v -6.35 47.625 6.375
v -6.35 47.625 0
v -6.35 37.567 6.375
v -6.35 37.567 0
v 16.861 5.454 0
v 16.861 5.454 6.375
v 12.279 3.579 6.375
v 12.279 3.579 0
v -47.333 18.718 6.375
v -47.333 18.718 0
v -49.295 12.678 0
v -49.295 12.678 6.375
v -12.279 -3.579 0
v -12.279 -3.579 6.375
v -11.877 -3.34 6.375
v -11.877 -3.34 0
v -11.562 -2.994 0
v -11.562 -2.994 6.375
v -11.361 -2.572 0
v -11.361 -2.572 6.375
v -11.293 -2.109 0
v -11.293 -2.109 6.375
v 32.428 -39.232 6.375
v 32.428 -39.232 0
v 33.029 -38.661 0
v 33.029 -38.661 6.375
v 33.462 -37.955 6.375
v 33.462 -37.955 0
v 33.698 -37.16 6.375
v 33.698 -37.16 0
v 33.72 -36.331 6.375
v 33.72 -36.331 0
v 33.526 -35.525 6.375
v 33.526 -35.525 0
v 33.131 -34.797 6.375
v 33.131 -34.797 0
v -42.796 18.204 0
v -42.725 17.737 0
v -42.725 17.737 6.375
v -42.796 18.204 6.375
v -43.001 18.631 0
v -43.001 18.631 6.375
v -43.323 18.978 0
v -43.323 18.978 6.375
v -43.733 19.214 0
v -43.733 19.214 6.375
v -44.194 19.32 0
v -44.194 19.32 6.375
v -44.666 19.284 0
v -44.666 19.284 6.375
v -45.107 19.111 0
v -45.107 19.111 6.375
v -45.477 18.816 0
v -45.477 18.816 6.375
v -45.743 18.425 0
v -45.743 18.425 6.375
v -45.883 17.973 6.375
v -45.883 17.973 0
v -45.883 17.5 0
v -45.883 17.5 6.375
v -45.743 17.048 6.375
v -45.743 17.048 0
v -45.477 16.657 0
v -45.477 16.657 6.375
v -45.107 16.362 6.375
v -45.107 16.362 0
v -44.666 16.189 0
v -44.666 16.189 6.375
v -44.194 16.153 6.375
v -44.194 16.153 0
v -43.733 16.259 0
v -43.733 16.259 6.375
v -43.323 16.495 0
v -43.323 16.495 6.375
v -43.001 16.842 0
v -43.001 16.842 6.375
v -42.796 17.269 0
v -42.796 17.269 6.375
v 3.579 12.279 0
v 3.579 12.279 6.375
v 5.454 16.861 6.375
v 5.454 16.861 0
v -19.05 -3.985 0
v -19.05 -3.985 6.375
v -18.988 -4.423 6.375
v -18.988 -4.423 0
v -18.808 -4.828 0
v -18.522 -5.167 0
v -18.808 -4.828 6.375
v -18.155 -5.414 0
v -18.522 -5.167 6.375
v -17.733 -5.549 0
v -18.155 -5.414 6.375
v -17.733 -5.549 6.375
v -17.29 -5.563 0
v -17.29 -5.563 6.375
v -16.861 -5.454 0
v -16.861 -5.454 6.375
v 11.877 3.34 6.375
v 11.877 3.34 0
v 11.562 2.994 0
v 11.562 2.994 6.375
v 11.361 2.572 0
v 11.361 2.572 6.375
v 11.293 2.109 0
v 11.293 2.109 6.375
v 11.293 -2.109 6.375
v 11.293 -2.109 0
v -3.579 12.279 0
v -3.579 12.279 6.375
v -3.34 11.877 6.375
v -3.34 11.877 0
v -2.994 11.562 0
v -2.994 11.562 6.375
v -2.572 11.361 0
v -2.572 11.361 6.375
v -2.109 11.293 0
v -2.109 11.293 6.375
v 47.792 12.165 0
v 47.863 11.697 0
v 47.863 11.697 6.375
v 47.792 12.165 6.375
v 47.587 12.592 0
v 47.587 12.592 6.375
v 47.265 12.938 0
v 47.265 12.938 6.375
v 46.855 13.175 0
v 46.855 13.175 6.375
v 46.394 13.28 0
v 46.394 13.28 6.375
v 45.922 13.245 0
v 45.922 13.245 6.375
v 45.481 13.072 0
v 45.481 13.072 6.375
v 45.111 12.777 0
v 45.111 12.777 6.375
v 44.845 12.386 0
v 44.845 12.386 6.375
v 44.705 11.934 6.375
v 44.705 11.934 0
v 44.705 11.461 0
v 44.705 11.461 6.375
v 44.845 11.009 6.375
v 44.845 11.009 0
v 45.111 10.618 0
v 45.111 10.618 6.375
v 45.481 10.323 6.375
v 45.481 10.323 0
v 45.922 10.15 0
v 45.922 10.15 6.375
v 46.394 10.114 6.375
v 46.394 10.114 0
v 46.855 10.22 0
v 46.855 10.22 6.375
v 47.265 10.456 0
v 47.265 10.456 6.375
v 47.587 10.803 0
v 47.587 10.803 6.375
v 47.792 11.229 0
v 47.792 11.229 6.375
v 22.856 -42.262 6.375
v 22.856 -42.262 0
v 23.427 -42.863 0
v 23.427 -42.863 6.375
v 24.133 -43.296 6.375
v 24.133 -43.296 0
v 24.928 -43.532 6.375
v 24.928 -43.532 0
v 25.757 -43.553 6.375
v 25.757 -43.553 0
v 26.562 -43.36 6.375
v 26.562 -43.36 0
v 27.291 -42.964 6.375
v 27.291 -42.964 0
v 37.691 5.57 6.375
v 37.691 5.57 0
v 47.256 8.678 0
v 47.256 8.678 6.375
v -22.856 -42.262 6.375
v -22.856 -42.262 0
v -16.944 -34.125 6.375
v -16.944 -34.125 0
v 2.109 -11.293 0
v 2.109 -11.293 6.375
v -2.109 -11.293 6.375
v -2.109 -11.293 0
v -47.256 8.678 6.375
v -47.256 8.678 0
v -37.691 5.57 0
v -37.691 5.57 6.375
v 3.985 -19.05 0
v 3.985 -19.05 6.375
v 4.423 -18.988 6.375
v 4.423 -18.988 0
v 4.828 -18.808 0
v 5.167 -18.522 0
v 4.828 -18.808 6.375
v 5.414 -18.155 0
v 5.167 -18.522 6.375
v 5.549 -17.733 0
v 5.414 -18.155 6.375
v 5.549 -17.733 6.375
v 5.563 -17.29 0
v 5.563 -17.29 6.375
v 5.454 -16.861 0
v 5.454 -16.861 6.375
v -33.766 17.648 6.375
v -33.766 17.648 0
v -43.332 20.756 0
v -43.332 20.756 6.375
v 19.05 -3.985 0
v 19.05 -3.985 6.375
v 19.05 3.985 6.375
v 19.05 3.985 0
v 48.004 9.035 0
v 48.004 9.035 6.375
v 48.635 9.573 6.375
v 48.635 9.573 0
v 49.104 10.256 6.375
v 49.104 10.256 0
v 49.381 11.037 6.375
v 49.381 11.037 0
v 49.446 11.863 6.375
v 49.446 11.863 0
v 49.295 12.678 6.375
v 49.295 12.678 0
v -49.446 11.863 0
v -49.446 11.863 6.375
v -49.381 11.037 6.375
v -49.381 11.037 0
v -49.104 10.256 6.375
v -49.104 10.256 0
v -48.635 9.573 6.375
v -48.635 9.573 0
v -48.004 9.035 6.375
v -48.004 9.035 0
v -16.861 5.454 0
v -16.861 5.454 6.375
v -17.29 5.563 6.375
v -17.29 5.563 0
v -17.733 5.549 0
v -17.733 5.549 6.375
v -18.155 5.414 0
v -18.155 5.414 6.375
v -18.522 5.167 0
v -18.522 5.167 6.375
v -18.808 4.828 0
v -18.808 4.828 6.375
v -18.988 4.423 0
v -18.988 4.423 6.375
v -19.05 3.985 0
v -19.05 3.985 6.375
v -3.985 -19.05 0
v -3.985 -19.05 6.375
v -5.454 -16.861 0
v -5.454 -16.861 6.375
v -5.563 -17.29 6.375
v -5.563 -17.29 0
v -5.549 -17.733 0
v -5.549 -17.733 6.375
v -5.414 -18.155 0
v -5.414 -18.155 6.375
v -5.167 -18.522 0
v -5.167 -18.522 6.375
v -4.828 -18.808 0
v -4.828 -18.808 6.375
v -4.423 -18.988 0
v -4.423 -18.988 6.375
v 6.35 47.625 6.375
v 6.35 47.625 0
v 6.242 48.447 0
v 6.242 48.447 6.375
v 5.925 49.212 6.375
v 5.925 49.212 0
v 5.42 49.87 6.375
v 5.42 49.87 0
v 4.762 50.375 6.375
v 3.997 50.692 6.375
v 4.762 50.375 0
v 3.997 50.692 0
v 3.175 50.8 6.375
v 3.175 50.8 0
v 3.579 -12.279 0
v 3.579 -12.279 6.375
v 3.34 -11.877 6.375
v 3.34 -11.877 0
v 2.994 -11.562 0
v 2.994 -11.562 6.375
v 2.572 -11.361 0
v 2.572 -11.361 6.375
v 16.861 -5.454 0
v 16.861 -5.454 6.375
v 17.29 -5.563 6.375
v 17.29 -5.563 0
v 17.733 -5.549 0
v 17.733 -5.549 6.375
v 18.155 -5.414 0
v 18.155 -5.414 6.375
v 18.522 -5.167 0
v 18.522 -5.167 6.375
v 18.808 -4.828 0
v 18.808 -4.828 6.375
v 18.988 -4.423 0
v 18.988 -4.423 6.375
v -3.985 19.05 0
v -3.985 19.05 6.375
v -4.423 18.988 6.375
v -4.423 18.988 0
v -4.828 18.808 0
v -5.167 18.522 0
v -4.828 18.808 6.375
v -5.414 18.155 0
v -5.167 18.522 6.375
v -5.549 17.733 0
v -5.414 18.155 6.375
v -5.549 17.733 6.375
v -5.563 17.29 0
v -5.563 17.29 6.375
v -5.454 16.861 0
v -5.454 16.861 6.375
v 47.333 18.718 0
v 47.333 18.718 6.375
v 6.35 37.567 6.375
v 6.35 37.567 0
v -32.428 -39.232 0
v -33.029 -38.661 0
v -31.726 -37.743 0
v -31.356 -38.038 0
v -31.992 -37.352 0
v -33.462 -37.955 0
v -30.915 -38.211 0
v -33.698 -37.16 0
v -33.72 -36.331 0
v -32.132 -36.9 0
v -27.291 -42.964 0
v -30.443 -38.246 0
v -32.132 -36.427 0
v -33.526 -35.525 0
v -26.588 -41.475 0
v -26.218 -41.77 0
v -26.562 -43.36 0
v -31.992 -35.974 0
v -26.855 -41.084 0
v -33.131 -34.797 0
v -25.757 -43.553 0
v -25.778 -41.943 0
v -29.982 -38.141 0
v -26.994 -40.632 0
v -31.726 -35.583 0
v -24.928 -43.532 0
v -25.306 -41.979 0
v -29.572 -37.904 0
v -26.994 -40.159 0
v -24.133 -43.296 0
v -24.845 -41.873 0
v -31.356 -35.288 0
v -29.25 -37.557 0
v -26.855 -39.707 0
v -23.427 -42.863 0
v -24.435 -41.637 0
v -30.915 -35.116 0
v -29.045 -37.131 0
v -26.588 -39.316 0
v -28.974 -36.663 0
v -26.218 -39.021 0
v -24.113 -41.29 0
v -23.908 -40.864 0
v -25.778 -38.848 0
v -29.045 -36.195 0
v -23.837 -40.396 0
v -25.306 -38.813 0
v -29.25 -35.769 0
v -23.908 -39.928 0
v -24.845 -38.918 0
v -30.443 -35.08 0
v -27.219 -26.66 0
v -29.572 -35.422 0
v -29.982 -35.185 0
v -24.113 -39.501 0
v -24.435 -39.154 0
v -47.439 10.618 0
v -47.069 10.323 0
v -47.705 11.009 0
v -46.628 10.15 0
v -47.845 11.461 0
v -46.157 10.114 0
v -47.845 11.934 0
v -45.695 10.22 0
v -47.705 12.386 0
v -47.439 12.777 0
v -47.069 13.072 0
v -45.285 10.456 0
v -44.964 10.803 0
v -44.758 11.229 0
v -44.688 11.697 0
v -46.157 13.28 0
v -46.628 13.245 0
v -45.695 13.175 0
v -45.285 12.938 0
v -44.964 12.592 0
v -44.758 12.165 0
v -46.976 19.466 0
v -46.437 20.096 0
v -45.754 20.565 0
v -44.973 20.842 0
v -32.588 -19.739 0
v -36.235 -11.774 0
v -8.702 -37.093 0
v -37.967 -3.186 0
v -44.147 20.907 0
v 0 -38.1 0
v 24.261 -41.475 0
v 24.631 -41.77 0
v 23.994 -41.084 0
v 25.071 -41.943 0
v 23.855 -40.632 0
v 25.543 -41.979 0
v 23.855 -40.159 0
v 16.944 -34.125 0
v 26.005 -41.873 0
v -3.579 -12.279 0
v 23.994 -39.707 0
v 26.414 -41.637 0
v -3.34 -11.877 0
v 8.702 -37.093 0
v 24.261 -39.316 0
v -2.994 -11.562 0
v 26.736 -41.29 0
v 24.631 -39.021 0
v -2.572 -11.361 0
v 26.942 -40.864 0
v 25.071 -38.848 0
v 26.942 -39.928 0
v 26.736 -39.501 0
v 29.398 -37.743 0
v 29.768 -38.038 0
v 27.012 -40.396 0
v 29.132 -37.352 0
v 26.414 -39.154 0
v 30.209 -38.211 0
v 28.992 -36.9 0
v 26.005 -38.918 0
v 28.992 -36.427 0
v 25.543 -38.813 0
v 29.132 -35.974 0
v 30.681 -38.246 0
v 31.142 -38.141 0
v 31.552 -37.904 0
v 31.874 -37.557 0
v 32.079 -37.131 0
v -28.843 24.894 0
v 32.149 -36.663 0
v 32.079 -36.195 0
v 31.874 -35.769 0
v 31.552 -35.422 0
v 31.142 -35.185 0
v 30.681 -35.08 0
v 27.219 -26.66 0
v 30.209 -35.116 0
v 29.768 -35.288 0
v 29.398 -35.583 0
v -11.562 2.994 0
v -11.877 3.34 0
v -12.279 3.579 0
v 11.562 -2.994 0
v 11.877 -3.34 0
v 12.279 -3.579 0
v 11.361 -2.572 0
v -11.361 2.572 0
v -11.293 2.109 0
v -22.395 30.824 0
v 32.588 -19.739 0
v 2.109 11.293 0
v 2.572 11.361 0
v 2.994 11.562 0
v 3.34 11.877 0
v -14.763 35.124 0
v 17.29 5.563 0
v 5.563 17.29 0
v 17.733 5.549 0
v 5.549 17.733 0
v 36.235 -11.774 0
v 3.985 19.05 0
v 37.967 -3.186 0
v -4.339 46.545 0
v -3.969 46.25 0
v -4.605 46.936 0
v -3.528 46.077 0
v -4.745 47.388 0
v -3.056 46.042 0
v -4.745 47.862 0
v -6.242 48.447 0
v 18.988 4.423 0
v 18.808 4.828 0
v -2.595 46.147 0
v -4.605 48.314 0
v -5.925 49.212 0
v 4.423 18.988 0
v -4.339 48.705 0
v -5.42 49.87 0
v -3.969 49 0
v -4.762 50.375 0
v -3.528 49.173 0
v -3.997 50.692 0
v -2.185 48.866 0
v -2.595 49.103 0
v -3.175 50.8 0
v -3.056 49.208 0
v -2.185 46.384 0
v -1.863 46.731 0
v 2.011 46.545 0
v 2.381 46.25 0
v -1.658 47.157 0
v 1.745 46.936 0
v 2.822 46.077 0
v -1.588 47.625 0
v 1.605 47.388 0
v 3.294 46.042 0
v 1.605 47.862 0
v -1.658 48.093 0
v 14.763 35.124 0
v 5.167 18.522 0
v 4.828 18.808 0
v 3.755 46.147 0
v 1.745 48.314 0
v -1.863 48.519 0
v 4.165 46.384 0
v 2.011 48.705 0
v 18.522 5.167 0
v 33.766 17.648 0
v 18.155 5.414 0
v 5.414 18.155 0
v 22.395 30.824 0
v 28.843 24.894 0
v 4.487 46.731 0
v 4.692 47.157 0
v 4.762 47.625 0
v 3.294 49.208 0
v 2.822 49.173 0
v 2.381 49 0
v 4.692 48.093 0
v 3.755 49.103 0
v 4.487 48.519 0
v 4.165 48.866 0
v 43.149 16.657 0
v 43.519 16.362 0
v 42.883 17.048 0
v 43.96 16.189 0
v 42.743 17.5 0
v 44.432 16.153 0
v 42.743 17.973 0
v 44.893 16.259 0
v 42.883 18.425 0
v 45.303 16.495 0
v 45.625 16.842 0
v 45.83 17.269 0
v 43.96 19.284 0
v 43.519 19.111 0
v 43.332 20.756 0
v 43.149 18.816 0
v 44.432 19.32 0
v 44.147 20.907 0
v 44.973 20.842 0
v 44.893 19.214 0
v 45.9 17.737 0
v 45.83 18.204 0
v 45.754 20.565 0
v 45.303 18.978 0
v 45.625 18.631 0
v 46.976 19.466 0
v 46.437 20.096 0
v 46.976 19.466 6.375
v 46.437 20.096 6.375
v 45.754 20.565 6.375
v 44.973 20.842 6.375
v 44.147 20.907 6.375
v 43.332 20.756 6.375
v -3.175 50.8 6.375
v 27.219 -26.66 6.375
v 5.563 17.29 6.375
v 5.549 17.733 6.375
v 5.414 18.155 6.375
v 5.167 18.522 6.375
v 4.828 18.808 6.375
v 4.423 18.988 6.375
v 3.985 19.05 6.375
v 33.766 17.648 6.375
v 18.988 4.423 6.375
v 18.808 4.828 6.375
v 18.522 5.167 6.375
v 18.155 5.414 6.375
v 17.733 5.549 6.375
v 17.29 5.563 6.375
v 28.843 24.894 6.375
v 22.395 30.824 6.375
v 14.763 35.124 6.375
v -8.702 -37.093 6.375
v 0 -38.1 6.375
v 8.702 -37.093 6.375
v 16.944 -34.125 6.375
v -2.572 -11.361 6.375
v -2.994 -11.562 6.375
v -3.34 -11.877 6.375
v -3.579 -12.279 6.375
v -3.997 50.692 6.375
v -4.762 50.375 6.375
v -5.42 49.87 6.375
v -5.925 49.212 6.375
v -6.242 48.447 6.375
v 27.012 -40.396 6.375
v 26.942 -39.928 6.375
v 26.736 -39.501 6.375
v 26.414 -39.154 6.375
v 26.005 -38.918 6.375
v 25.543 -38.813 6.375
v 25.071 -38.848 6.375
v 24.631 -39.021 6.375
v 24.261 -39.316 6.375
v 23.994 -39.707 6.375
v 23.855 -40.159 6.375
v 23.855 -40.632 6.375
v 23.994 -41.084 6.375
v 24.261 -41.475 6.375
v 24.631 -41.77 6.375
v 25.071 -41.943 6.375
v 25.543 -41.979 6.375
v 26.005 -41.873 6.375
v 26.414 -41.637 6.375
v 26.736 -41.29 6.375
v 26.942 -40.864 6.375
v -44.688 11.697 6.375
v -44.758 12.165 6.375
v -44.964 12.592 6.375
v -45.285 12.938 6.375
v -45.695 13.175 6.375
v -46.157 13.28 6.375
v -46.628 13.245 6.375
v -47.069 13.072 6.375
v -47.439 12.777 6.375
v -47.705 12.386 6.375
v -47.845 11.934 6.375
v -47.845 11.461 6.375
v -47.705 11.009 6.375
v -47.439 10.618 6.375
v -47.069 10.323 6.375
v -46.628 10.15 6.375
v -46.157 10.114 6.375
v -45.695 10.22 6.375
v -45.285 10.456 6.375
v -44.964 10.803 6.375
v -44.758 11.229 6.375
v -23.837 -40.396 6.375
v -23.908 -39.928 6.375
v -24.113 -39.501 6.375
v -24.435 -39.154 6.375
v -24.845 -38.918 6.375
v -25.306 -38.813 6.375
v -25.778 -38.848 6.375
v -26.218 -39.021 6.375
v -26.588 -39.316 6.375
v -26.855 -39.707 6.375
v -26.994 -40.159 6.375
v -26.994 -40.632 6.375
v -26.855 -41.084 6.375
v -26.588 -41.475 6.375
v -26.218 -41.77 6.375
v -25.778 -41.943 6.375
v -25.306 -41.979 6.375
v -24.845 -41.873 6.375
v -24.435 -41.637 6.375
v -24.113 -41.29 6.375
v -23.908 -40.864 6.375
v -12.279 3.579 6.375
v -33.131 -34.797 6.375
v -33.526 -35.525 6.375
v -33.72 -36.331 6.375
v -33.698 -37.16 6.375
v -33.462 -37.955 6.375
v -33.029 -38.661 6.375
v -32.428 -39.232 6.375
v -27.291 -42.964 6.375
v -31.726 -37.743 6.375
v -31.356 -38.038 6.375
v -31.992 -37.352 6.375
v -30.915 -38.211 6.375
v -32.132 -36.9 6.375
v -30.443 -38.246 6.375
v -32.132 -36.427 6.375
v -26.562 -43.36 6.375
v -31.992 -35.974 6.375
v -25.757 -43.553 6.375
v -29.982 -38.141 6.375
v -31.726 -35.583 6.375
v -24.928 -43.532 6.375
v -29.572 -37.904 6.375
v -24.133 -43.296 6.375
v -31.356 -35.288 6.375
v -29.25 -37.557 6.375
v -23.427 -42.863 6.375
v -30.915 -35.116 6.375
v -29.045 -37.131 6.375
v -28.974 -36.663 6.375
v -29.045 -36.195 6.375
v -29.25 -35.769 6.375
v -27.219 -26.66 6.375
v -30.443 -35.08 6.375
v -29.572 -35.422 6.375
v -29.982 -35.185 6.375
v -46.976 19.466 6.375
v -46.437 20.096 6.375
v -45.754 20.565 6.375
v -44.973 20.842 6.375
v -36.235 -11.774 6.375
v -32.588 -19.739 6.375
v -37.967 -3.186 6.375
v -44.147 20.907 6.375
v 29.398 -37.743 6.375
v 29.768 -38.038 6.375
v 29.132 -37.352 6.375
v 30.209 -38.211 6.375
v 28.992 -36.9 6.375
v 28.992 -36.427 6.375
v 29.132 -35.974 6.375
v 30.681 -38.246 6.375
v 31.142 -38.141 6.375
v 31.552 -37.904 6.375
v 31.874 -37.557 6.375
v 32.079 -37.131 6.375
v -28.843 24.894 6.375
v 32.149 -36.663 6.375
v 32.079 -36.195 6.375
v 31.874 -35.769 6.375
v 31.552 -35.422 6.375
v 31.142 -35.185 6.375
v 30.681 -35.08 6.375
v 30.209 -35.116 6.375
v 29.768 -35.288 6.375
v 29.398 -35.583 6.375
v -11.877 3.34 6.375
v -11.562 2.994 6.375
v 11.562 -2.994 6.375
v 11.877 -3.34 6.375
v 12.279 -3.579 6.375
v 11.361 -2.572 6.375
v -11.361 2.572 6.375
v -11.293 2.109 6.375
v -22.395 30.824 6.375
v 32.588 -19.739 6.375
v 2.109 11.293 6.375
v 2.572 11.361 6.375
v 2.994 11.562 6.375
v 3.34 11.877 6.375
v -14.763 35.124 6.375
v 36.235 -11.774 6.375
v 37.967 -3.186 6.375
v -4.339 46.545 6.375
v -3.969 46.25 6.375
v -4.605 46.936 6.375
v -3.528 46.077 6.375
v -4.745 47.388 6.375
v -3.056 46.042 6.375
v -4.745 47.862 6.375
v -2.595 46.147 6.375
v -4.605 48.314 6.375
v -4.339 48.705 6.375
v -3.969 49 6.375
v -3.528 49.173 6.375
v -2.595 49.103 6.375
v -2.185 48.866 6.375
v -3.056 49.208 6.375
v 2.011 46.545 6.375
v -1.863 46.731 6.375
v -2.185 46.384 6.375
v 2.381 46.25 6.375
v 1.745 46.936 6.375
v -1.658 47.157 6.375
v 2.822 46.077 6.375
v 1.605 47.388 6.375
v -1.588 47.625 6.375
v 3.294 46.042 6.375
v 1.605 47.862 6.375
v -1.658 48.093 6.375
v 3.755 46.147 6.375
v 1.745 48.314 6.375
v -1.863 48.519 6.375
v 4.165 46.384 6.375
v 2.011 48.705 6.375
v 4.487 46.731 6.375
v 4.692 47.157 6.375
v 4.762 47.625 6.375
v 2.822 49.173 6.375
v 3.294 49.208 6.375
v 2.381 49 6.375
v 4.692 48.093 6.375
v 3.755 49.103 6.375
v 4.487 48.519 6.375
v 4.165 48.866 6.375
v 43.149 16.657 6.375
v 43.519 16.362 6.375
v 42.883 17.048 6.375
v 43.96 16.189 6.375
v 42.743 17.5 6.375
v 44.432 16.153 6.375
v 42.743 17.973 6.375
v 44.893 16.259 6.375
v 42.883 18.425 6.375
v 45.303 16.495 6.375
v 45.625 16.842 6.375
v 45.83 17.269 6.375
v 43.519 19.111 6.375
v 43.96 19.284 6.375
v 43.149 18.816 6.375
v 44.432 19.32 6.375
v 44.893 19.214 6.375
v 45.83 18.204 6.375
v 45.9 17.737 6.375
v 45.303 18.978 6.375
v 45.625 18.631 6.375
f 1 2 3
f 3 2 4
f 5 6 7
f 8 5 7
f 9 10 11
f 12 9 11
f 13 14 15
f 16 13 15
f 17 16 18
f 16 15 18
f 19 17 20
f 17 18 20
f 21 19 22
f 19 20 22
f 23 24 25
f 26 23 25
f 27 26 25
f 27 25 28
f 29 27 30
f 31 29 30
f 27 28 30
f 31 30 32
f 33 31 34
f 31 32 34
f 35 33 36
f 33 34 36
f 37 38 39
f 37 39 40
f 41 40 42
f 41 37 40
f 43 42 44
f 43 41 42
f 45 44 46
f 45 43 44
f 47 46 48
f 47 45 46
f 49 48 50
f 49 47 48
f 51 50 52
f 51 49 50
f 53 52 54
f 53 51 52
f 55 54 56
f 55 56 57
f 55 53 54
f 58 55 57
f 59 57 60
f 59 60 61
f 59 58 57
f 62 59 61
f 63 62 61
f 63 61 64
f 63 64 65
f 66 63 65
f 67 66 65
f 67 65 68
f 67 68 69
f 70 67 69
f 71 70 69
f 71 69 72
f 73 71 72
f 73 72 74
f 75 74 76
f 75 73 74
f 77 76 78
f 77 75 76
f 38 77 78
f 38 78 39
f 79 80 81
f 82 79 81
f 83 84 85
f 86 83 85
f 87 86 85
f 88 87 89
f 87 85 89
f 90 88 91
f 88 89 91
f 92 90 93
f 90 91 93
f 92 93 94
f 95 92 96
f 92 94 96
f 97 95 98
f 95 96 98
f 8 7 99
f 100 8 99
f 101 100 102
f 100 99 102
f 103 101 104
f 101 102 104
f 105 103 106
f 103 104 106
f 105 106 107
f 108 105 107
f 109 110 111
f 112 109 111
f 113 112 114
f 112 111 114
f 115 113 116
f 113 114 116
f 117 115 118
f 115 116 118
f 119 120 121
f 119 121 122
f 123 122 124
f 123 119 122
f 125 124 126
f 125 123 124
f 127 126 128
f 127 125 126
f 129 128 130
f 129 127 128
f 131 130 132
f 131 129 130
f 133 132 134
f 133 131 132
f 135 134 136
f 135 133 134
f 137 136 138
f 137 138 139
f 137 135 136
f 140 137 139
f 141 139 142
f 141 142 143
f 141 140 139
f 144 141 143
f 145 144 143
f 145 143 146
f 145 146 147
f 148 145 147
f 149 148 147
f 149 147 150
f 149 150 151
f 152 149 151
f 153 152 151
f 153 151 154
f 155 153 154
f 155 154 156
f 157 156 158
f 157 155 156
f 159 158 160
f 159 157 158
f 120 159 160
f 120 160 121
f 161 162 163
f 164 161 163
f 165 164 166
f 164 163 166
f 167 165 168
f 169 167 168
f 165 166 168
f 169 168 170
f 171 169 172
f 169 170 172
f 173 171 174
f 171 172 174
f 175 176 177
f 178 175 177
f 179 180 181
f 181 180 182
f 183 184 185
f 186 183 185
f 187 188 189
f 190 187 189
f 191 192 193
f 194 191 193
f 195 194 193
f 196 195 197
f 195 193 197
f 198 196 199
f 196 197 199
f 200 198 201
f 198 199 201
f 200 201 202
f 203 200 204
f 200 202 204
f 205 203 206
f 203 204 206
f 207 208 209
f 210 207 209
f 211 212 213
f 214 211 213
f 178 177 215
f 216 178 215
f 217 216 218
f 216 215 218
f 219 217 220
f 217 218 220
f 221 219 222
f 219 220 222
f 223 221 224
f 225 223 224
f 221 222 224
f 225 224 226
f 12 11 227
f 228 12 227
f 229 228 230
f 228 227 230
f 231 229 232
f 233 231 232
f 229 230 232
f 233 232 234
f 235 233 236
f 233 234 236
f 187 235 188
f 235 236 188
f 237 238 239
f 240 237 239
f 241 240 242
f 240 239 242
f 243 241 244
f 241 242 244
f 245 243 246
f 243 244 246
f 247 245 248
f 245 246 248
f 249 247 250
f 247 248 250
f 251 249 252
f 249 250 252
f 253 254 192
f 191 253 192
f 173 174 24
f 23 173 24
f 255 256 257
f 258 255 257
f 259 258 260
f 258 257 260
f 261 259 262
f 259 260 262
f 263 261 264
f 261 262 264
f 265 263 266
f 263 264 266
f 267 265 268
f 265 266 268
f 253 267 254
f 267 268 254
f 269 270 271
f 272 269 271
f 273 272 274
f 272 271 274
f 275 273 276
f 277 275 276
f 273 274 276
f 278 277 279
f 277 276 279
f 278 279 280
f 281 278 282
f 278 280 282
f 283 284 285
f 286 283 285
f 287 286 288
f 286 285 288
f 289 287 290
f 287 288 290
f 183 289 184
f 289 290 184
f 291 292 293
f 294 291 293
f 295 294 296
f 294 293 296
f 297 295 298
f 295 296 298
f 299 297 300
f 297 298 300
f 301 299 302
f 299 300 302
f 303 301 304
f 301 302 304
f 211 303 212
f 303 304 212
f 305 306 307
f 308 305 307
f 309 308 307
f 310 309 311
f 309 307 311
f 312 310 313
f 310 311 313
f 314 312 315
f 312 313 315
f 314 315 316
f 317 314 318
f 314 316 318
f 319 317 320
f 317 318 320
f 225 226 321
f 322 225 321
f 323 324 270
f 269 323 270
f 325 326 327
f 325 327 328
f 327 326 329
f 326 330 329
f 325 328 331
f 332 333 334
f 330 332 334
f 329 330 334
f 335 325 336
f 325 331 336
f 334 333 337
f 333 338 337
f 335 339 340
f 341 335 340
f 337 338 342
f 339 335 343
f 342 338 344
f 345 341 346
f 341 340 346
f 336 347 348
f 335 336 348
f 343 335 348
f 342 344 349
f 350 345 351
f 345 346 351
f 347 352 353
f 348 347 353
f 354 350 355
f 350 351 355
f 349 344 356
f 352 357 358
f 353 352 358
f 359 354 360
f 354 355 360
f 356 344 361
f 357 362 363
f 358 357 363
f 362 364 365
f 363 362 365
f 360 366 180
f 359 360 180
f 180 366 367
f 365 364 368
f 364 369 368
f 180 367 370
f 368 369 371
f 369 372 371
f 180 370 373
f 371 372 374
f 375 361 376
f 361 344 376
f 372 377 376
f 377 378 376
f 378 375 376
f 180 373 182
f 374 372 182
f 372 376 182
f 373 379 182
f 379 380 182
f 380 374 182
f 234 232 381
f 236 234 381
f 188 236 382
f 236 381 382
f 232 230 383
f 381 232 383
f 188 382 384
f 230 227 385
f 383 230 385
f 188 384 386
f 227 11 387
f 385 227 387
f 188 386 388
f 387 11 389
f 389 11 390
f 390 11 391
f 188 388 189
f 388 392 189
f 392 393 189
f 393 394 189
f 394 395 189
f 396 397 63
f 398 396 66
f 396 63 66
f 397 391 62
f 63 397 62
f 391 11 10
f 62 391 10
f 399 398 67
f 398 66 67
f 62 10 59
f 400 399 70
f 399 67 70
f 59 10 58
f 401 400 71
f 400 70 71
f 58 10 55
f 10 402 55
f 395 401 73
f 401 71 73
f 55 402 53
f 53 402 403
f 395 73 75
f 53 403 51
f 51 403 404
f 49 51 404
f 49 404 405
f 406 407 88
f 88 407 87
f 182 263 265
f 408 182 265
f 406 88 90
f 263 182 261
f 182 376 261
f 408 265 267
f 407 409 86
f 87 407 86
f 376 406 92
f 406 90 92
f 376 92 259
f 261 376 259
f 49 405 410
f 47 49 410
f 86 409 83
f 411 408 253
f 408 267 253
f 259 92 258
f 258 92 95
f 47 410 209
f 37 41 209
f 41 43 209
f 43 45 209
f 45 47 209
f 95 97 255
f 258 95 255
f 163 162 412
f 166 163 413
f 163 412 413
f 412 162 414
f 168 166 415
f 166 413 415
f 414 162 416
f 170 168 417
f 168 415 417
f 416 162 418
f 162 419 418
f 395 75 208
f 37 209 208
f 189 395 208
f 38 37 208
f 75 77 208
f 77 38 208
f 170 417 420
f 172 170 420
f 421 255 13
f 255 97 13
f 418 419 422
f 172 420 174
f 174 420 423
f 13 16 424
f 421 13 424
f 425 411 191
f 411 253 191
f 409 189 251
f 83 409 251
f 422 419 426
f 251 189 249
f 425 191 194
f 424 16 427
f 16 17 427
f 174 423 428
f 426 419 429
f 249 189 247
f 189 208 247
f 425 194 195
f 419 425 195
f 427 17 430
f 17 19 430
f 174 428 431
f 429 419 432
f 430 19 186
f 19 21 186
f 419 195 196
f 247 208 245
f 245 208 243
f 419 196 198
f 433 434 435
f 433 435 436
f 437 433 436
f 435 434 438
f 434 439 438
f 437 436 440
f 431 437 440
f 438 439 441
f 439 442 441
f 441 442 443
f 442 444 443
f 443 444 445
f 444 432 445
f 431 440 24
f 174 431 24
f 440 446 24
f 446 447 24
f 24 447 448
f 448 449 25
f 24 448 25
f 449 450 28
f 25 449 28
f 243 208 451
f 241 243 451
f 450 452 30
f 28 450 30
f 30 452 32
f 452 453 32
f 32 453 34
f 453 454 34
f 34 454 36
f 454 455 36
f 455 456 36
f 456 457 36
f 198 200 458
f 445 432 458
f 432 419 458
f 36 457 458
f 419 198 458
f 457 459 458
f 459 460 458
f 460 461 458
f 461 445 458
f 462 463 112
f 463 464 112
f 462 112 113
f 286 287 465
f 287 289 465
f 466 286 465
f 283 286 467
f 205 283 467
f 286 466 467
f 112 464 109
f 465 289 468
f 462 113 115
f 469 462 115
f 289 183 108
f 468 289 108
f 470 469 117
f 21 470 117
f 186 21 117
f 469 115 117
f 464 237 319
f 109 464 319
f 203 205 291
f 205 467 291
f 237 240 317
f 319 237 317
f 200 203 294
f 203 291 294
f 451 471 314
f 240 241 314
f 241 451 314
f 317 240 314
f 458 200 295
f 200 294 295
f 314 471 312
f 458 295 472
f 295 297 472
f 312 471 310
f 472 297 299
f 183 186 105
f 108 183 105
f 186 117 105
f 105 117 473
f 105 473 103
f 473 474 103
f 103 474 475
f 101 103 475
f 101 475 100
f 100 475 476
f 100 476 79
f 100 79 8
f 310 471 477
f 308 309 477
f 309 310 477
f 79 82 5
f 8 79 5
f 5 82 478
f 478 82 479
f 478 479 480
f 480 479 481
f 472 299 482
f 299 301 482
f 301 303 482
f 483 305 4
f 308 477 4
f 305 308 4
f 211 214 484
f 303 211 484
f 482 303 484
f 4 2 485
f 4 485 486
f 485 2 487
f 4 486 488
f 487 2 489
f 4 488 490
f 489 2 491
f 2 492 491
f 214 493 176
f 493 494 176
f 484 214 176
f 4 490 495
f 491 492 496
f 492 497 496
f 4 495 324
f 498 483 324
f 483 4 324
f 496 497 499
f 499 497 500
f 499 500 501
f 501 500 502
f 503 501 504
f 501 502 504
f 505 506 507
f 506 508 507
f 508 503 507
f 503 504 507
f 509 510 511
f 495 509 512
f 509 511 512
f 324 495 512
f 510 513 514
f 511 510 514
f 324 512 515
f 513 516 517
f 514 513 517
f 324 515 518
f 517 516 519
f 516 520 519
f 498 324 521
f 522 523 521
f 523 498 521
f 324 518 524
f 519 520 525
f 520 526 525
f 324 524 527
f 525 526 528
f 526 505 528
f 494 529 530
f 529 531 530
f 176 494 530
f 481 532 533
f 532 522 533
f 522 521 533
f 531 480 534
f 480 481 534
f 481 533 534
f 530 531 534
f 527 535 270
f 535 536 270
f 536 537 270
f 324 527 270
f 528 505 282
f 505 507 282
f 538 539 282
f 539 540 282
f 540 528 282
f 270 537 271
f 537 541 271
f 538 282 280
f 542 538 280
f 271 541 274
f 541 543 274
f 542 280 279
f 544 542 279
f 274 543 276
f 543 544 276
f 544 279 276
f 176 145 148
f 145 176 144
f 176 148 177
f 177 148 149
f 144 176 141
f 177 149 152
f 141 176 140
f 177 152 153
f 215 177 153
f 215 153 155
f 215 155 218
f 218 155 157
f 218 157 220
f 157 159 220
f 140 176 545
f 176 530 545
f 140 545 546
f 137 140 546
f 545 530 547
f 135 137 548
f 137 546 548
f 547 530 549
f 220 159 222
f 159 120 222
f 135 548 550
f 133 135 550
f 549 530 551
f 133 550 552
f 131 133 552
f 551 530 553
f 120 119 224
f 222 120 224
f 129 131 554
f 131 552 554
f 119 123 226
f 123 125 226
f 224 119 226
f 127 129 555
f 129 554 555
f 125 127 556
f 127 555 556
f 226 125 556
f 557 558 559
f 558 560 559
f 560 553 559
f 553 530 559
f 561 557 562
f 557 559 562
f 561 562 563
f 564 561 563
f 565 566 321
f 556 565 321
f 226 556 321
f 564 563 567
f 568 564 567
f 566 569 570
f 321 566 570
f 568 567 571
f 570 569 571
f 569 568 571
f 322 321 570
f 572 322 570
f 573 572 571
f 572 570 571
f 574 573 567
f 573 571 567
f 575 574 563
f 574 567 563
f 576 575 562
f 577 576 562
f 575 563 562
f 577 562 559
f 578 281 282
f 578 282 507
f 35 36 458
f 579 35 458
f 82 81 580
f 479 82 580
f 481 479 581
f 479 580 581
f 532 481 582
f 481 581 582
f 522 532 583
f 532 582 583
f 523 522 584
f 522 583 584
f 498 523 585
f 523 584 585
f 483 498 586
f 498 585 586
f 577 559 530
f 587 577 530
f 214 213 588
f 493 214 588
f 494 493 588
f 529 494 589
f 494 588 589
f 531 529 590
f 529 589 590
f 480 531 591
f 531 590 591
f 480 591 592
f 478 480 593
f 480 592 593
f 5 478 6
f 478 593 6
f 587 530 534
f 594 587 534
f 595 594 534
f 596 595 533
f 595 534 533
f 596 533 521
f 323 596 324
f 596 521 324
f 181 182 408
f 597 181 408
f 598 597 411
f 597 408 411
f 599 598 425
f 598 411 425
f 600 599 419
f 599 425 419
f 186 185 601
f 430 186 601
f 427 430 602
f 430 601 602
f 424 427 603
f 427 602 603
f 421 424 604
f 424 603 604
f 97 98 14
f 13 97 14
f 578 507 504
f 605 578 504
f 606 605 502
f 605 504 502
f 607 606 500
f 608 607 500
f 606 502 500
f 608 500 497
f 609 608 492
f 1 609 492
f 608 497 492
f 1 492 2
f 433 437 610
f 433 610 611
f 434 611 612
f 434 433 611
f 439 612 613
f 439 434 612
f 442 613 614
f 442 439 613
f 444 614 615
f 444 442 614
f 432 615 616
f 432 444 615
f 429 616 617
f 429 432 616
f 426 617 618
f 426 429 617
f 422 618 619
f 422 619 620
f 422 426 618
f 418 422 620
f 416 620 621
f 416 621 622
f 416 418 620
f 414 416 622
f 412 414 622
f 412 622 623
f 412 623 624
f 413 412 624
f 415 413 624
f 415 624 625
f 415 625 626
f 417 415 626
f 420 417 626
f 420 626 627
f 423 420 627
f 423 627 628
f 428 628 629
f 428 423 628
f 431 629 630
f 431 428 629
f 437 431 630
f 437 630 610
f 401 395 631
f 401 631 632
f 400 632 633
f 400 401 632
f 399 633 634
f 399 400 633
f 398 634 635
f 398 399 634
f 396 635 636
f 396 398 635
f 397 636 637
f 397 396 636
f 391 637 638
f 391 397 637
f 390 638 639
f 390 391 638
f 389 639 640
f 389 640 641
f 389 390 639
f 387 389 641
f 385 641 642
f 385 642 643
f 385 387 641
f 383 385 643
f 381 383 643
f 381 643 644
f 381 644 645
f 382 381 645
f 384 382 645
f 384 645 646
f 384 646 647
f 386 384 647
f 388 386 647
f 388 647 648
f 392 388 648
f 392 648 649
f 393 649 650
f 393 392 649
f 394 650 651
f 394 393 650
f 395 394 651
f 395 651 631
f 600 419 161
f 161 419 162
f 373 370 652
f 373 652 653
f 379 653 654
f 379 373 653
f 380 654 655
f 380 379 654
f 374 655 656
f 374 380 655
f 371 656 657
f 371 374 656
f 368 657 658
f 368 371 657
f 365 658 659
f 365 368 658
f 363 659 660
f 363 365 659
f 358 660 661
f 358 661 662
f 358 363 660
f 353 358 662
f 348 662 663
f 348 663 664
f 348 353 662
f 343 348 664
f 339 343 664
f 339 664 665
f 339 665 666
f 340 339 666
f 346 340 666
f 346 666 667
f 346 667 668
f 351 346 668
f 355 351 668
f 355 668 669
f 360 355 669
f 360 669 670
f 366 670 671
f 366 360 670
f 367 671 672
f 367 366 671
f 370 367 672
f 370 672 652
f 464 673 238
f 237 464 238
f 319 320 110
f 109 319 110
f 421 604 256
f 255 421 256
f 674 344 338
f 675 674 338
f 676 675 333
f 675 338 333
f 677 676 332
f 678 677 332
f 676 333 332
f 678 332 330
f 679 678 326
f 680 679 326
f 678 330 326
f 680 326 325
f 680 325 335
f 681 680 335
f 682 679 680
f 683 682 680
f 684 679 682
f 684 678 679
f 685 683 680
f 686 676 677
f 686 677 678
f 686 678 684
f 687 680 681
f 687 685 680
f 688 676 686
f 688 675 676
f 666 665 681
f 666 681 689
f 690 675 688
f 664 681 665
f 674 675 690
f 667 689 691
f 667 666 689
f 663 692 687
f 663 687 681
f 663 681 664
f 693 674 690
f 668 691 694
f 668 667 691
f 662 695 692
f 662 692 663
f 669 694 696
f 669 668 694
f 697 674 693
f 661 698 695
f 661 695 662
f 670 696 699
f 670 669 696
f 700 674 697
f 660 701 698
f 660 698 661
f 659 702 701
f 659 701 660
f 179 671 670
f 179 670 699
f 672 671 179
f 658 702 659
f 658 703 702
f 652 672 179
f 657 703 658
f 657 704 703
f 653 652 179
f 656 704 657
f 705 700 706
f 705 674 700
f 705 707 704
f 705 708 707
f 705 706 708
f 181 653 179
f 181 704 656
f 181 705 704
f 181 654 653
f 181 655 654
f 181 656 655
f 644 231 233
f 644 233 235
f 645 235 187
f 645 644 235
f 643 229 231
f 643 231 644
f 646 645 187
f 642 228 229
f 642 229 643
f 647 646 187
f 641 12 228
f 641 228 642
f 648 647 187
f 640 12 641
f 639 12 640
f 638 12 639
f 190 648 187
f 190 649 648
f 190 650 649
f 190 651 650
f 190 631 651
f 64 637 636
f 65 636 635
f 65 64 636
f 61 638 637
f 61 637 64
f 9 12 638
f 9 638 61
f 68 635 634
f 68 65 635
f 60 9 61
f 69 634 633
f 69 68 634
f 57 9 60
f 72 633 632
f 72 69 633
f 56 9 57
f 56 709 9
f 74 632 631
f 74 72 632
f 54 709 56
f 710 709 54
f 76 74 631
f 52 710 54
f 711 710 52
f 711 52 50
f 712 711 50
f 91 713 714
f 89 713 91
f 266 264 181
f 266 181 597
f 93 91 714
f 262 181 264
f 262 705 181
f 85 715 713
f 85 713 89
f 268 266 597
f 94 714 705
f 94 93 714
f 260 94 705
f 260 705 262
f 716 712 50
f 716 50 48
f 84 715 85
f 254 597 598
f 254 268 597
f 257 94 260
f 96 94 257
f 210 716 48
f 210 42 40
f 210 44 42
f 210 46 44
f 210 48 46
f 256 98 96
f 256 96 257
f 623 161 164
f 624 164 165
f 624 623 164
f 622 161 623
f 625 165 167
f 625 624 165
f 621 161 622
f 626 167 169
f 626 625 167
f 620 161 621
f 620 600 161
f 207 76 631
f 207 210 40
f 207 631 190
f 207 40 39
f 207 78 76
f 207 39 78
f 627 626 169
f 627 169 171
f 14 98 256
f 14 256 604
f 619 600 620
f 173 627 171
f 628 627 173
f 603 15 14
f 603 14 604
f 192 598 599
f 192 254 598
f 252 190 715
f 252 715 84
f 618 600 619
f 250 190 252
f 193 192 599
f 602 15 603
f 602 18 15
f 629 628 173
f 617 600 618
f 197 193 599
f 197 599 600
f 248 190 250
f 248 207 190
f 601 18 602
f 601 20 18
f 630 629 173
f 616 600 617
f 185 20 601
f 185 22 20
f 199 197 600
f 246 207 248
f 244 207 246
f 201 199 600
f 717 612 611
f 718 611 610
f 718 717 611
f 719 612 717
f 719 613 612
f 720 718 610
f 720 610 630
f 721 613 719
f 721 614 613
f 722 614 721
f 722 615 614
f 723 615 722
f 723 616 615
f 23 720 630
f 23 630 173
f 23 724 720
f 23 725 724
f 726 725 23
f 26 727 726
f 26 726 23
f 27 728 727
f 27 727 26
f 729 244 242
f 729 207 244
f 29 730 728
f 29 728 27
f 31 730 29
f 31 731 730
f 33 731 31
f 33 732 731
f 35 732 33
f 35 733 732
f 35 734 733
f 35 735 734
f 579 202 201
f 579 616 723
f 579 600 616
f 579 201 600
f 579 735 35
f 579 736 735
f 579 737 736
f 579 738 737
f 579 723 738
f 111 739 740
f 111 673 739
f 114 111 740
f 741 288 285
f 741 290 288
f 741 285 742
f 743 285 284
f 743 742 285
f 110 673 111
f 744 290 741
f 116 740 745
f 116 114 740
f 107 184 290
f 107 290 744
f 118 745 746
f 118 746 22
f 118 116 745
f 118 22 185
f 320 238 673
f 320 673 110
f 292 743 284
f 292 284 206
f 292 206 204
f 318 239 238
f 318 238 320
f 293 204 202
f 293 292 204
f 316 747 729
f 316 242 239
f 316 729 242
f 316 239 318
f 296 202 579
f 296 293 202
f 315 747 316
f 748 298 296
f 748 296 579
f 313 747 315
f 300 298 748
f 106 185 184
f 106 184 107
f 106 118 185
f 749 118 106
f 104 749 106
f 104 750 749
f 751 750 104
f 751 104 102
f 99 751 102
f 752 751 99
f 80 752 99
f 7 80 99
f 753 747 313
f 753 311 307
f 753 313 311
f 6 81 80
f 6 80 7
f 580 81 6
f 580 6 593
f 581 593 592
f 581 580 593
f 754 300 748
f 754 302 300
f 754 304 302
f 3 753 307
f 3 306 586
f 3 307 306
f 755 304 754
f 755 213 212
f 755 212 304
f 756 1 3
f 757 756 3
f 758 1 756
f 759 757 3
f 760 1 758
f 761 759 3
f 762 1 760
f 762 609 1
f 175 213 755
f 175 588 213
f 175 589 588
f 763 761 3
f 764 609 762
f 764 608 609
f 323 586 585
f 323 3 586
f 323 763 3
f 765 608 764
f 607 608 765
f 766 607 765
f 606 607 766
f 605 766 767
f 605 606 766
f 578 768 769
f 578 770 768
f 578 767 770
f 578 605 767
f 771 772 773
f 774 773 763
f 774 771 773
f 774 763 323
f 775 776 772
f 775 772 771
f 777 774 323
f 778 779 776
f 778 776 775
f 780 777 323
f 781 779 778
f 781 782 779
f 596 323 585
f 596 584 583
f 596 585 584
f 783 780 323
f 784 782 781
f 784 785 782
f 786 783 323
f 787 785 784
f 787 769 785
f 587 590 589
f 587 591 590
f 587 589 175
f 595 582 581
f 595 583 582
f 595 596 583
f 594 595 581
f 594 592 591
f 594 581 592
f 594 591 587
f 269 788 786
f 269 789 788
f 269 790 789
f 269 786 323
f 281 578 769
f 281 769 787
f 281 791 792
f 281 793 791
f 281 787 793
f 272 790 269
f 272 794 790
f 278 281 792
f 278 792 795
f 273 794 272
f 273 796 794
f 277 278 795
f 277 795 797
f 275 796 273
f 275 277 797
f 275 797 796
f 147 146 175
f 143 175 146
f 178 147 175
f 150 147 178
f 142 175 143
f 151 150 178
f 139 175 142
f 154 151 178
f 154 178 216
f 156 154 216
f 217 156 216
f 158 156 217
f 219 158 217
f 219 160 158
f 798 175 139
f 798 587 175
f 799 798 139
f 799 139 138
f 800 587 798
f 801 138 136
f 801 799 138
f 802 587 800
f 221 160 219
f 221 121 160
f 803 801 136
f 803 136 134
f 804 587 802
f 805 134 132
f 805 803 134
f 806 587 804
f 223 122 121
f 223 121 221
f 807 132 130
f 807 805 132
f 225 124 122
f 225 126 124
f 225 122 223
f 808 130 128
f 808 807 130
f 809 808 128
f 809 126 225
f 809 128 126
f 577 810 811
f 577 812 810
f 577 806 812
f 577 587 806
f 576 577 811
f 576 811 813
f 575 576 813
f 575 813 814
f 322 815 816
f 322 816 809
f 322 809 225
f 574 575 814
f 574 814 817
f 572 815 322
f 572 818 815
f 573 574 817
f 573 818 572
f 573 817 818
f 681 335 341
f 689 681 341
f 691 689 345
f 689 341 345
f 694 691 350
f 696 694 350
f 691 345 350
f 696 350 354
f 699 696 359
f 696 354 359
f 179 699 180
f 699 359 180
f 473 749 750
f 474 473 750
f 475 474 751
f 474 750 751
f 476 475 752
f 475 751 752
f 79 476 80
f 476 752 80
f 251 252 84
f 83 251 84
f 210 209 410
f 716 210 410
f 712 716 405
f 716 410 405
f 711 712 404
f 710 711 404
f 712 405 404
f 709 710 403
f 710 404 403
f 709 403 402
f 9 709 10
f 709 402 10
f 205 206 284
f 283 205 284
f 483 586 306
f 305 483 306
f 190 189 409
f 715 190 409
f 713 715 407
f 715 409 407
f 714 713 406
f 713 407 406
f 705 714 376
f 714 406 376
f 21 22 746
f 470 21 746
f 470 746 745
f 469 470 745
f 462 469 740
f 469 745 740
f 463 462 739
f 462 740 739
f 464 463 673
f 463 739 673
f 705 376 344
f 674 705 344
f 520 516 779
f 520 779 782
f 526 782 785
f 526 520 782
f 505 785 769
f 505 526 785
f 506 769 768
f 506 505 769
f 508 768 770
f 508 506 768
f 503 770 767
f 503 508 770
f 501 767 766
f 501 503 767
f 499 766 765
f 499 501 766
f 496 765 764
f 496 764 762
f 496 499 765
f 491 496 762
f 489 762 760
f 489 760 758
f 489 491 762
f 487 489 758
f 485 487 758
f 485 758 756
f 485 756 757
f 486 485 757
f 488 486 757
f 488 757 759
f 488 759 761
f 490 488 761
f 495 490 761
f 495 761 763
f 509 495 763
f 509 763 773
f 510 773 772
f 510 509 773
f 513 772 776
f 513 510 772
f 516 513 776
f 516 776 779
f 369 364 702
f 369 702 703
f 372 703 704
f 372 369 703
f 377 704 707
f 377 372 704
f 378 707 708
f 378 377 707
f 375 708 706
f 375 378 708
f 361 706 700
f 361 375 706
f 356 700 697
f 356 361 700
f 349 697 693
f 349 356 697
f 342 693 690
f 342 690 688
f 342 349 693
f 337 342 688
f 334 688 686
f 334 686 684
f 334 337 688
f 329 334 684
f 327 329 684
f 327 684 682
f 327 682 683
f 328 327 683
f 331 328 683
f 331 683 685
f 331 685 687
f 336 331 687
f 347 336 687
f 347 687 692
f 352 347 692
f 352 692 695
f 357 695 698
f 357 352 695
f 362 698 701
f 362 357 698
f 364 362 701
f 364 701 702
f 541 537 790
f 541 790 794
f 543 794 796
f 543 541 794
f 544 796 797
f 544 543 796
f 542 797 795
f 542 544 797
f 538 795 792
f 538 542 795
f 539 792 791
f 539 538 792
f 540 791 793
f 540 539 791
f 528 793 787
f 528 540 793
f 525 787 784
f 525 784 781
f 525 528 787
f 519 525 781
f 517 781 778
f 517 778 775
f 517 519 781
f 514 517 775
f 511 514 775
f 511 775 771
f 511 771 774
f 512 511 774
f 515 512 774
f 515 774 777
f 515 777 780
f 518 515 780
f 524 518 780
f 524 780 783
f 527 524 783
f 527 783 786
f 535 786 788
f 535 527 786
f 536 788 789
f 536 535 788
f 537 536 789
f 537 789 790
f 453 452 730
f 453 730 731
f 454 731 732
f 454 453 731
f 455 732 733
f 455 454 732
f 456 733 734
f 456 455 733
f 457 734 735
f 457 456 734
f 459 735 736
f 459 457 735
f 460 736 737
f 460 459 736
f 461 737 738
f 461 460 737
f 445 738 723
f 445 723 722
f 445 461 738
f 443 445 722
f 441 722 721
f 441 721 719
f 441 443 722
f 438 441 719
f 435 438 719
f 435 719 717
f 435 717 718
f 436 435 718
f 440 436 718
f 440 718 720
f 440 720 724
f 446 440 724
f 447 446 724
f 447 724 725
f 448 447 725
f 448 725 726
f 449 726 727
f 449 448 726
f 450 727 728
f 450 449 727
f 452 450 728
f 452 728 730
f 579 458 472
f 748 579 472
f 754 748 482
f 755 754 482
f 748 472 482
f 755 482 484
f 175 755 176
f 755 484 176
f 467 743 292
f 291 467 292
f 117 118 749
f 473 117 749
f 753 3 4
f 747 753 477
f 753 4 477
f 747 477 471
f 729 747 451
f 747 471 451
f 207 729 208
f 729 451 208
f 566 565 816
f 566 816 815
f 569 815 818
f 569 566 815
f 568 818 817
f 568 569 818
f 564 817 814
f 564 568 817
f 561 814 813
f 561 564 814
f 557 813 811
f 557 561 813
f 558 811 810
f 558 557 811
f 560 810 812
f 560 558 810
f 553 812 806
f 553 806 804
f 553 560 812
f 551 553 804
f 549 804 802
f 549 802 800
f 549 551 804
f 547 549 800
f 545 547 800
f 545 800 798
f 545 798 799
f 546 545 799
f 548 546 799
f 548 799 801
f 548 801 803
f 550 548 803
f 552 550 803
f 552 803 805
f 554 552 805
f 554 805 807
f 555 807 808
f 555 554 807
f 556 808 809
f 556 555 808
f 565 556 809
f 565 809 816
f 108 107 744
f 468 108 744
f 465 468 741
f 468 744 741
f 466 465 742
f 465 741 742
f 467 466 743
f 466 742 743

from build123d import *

# Parameters (mm, degrees)
F0_R     = 1.5875
F1_DEPTH = 6.3754
F3_DEPTH = 6.3764


with BuildPart() as f1:
    # F0 (on Top) → F1 (new body)
    with BuildSketch(Plane.XY):
        with BuildLine():
            Line((-6.35, 47.625), (-6.35, 37.567107))
            ThreePointArc((-6.35, 37.567107), (-22.394618, 30.823547), (-33.766184, 17.648083))
            Line((-33.766184, 17.648083), (-43.331809, 20.756143))
            ThreePointArc((-43.331809, 20.756143), (-45.754357, 20.565485), (-47.332542, 18.717668))
            Line((-47.332542, 18.717668), (-49.2948, 12.678459))
            ThreePointArc((-49.2948, 12.678459), (-49.104141, 10.25591), (-47.256325, 8.677725))
            Line((-47.256325, 8.677725), (-37.690699, 5.569665))
            ThreePointArc((-37.690699, 5.569665), (-36.235253, -11.773547), (-27.218649, -26.659991))
            Line((-27.218649, -26.659991), (-33.130531, -34.796998))
            ThreePointArc((-33.130531, -34.796998), (-33.697812, -37.159896), (-32.42812, -39.231845))
            Line((-32.42812, -39.231845), (-27.290862, -42.964281))
            ThreePointArc((-27.290862, -42.964281), (-24.927964, -43.531563), (-22.856015, -42.261871))
            Line((-22.856015, -42.261871), (-16.944133, -34.124864))
            ThreePointArc((-16.944133, -34.124864), (0, -38.1), (16.944133, -34.124864))
            Line((16.944133, -34.124864), (22.856015, -42.261871))
            ThreePointArc((22.856015, -42.261871), (24.927964, -43.531563), (27.290862, -42.964281))
            Line((27.290862, -42.964281), (32.42812, -39.231845))
            ThreePointArc((32.42812, -39.231845), (33.697812, -37.159896), (33.130531, -34.796998))
            Line((33.130531, -34.796998), (27.218649, -26.659991))
            ThreePointArc((27.218649, -26.659991), (36.235253, -11.773547), (37.690699, 5.569665))
            Line((37.690699, 5.569665), (47.256325, 8.677725))
            ThreePointArc((47.256325, 8.677725), (49.104141, 10.25591), (49.2948, 12.678459))
            Line((49.2948, 12.678459), (47.332542, 18.717668))
            ThreePointArc((47.332542, 18.717668), (45.754357, 20.565485), (43.331809, 20.756143))
            Line((43.331809, 20.756143), (33.766184, 17.648083))
            ThreePointArc((33.766184, 17.648083), (22.394618, 30.823547), (6.35, 37.567107))
            Line((6.35, 37.567107), (6.35, 47.625))
            ThreePointArc((6.35, 47.625), (5.420064, 49.870064), (3.175, 50.8))
            Line((3.175, 50.8), (-3.175, 50.8))
            ThreePointArc((-3.175, 50.8), (-5.420064, 49.870064), (-6.35, 47.625))
        make_face()
        with Locations((-25.424644, -40.395653)):
            Circle(F0_R, mode=Mode.SUBTRACT)
        with Locations((-30.561902, -36.663216)):
            Circle(F0_R, mode=Mode.SUBTRACT)
        with Locations((25.424644, -40.395653)):
            Circle(F0_R, mode=Mode.SUBTRACT)
        with Locations((30.561902, -36.663216)):
            Circle(F0_R, mode=Mode.SUBTRACT)
        with Locations((-46.275196, 11.69733)):
            Circle(F0_R, mode=Mode.SUBTRACT)
        with Locations((-44.312938, 17.736539)):
            Circle(F0_R, mode=Mode.SUBTRACT)
        with Locations((-3.175, 47.625)):
            Circle(F0_R, mode=Mode.SUBTRACT)
        with Locations((46.275196, 11.69733)):
            Circle(F0_R, mode=Mode.SUBTRACT)
        with Locations((44.312938, 17.736539)):
            Circle(F0_R, mode=Mode.SUBTRACT)
        with Locations((3.175, 47.625)):
            Circle(F0_R, mode=Mode.SUBTRACT)
    extrude(amount=F1_DEPTH)

    # F2 (on face) → F3 (cut, through all)
    with BuildSketch(Plane.XY.offset(6.3754)):
        with BuildLine():
            Line((3.984938, 19.05), (0, 19.05))
            Line((0, 19.05), (-3.984938, 19.05))
            ThreePointArc((-3.984938, 19.05), (-5.303035, 18.347246), (-5.454143, 16.861174))
            Line((-5.454143, 16.861174), (-3.578628, 12.278771))
            ThreePointArc((-3.578628, 12.278771), (-2.994169, 11.562), (-2.109423, 11.292597))
            Line((-2.109423, 11.292597), (0, 11.292597))
            Line((0, 11.292597), (2.109423, 11.292597))
            ThreePointArc((2.109423, 11.292597), (2.994169, 11.562), (3.578628, 12.278771))
            Line((3.578628, 12.278771), (5.454143, 16.861174))
            ThreePointArc((5.454143, 16.861174), (5.303035, 18.347246), (3.984938, 19.05))
        make_face()
        with BuildLine():
            Line((19.05, -3.984938), (19.05, 0))
            Line((19.05, 0), (19.05, 3.984938))
            ThreePointArc((19.05, 3.984938), (18.347246, 5.303035), (16.861174, 5.454143))
            Line((16.861174, 5.454143), (12.278771, 3.578628))
            ThreePointArc((12.278771, 3.578628), (11.562, 2.994169), (11.292597, 2.109423))
            Line((11.292597, 2.109423), (11.292597, 0))
            Line((11.292597, 0), (11.292597, -2.109423))
            ThreePointArc((11.292597, -2.109423), (11.562, -2.994169), (12.278771, -3.578628))
            Line((12.278771, -3.578628), (16.861174, -5.454143))
            ThreePointArc((16.861174, -5.454143), (18.347246, -5.303035), (19.05, -3.984938))
        make_face()
        with BuildLine():
            Line((-3.984938, -19.05), (0, -19.05))
            Line((0, -19.05), (3.984938, -19.05))
            ThreePointArc((3.984938, -19.05), (5.303035, -18.347246), (5.454143, -16.861174))
            Line((5.454143, -16.861174), (3.578628, -12.278771))
            ThreePointArc((3.578628, -12.278771), (2.994169, -11.562), (2.109423, -11.292597))
            Line((2.109423, -11.292597), (0, -11.292597))
            Line((0, -11.292597), (-2.109423, -11.292597))
            ThreePointArc((-2.109423, -11.292597), (-2.994169, -11.562), (-3.578628, -12.278771))
            Line((-3.578628, -12.278771), (-5.454143, -16.861174))
            ThreePointArc((-5.454143, -16.861174), (-5.303035, -18.347246), (-3.984938, -19.05))
        make_face()
        with BuildLine():
            Line((-19.05, 3.984938), (-19.05, 0))
            Line((-19.05, 0), (-19.05, -3.984938))
            ThreePointArc((-19.05, -3.984938), (-18.347246, -5.303035), (-16.861174, -5.454143))
            Line((-16.861174, -5.454143), (-12.278771, -3.578628))
            ThreePointArc((-12.278771, -3.578628), (-11.562, -2.994169), (-11.292597, -2.109423))
            Line((-11.292597, -2.109423), (-11.292597, 0))
            Line((-11.292597, 0), (-11.292597, 2.109423))
            ThreePointArc((-11.292597, 2.109423), (-11.562, 2.994169), (-12.278771, 3.578628))
            Line((-12.278771, 3.578628), (-16.861174, 5.454143))
            ThreePointArc((-16.861174, 5.454143), (-18.347246, 5.303035), (-19.05, 3.984938))
        make_face()
    extrude(amount=-F3_DEPTH, mode=Mode.SUBTRACT)


solid = f1.part
